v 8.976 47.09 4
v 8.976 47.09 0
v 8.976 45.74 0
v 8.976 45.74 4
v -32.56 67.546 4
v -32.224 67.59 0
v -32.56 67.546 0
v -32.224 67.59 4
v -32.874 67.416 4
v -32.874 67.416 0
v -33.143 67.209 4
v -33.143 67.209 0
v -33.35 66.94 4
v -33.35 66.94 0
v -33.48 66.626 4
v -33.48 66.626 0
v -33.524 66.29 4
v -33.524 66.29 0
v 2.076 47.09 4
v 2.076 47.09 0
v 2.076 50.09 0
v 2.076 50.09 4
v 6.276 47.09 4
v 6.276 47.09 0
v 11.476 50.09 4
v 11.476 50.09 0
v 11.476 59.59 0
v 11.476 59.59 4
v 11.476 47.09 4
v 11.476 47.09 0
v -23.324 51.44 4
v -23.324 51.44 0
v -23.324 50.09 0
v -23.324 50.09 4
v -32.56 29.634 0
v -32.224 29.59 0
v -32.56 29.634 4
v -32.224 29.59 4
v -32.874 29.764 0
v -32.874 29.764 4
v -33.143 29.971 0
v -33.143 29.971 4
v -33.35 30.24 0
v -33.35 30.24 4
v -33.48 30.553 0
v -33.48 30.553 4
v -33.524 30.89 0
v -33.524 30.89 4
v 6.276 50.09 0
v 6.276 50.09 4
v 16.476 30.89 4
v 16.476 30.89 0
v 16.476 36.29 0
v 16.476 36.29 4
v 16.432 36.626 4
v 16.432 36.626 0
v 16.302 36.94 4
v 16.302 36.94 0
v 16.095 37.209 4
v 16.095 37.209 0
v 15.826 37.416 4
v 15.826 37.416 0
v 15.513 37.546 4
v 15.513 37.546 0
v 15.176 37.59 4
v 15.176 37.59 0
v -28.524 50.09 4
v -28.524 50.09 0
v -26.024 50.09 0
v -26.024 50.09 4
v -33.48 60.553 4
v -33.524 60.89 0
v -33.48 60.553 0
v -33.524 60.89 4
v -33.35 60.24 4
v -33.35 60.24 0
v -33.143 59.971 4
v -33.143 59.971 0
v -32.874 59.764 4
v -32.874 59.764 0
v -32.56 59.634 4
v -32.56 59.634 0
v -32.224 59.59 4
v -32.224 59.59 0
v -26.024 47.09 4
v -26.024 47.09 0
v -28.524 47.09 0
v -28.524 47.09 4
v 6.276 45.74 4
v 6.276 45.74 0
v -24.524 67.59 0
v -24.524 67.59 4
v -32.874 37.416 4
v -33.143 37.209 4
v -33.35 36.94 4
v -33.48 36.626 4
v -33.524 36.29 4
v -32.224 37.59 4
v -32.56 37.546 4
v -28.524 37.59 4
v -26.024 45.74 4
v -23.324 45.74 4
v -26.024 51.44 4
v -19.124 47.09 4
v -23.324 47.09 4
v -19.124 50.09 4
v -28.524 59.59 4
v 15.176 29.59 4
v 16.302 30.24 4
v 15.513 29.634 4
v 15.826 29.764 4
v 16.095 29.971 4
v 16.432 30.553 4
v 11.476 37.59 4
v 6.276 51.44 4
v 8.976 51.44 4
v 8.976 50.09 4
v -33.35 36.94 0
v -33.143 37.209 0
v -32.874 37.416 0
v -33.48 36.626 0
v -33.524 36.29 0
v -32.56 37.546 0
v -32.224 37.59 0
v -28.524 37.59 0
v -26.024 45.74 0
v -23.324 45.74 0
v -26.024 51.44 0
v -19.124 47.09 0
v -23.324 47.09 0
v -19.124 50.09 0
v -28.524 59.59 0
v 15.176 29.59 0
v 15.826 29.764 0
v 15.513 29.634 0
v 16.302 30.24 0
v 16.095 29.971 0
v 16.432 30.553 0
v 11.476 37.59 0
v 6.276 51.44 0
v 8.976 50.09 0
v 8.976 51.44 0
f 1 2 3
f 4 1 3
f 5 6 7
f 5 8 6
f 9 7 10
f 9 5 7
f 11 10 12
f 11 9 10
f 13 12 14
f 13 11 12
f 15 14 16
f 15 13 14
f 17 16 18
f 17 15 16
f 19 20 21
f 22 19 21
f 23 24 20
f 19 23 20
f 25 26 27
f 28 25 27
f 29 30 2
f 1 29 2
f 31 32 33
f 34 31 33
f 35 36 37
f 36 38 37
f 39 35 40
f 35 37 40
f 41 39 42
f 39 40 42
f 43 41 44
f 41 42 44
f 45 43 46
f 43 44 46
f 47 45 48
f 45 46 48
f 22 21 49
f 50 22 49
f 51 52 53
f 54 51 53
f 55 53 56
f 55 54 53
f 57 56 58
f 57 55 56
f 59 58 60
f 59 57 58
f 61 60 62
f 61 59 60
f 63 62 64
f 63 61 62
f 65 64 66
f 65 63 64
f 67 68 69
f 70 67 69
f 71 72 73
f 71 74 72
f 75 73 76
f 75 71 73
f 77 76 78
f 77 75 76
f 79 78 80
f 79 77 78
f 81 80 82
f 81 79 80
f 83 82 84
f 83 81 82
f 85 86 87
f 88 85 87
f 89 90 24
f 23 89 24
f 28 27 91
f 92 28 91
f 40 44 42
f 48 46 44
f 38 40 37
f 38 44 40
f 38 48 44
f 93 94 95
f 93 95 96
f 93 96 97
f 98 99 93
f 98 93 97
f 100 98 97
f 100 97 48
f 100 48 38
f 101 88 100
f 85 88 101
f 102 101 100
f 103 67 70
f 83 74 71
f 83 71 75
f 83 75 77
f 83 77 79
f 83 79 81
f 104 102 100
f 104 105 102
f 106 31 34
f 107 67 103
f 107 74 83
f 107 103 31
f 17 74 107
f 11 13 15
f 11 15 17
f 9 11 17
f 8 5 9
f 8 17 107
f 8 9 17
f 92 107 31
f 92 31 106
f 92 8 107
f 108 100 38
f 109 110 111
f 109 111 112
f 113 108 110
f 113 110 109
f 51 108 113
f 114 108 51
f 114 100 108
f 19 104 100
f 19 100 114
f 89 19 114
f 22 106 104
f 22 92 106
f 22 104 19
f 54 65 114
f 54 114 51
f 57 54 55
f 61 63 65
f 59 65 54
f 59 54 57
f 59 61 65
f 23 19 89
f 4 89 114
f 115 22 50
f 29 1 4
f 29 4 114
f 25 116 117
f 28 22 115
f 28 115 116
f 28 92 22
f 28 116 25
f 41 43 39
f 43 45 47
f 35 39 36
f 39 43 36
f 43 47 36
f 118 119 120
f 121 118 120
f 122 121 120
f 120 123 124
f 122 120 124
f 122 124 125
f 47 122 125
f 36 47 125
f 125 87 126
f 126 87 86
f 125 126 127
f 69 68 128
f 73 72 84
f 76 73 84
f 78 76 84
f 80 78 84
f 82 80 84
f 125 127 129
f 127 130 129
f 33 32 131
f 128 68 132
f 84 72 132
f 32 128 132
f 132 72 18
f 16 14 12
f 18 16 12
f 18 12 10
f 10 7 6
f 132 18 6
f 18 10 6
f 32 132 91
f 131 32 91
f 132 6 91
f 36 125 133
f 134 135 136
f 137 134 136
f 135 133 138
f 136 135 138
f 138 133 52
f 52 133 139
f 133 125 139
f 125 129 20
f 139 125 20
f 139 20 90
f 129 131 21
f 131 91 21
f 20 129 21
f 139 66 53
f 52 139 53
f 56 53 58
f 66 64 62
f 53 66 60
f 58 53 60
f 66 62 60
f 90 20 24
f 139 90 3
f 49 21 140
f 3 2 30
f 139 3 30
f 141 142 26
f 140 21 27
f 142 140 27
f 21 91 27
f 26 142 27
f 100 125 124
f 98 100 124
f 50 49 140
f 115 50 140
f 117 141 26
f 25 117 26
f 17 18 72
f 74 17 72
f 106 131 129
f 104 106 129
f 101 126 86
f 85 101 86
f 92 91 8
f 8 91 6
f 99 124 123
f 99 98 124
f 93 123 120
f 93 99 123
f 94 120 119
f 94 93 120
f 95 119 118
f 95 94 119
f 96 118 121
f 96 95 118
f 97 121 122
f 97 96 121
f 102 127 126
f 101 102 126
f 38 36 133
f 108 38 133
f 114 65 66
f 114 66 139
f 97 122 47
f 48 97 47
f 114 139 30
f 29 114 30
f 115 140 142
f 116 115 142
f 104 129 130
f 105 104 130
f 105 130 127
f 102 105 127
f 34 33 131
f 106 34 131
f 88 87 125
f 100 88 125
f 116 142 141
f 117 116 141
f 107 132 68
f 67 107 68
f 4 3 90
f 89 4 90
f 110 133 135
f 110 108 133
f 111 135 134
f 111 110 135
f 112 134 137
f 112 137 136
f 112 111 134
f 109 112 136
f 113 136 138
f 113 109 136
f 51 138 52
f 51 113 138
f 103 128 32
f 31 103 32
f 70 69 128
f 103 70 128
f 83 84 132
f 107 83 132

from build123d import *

# Parameters (mm, degrees)
EXTRUDE_1_DEPTH = 4
FILLET_1_R      = 1.3


with BuildPart() as part:
    # 草图1 → 凸台-拉伸1 (new body)
    with BuildSketch(Plane.XY):
        Polygon((-33.523824953, 29.589854129), (-28.523824953, 29.589854129), (11.476175047, 29.589854129), (16.476175047, 29.589854129), (16.476175047, 37.589854129), (11.476175047, 37.589854129), (11.476175047, 47.089854129), (8.976175047, 47.089854129), (8.976175047, 45.739854129), (6.276175047, 45.739854129), (6.276175047, 47.089854129), (2.076175047, 47.089854129), (2.076175047, 50.089854129), (6.276175047, 50.089854129), (6.276175047, 51.439854129), (8.976175047, 51.439854129), (8.976175047, 50.089854129), (11.476175047, 50.089854129), (11.476175047, 59.589854129), (-24.523824953, 67.589854129), (-28.523824953, 67.589854129), (-33.523824953, 67.589854129), (-33.523824953, 59.589854129), (-28.523824953, 59.589854129), (-28.523824953, 50.089854129), (-26.023824953, 50.089854129), (-26.023824953, 51.439854129), (-23.323824953, 51.439854129), (-23.323824953, 50.089854129), (-19.123824953, 50.089854129), (-19.123824953, 47.089854129), (-23.323824953, 47.089854129), (-23.323824953, 45.739854129), (-26.023824953, 45.739854129), (-26.023824953, 47.089854129), (-28.523824953, 47.089854129), (-28.523824953, 37.589854129), (-33.523824953, 37.589854129), align=None)
    extrude(amount=EXTRUDE_1_DEPTH)

    # 圆角1
    fillet_1_edges = [part.edges().sort_by_distance(p)[0] for p in [
        (-33.523824953, 59.589854129, 2),
        (-33.523824953, 67.589854129, 2),
        (16.476175047, 37.589854129, 2),
        (16.476175047, 29.589854129, 2),
        (-33.523824953, 29.589854129, 2),
        (-33.523824953, 37.589854129, 2),
    ]]
    fillet(fillet_1_edges, radius=FILLET_1_R)


solid = part.part
